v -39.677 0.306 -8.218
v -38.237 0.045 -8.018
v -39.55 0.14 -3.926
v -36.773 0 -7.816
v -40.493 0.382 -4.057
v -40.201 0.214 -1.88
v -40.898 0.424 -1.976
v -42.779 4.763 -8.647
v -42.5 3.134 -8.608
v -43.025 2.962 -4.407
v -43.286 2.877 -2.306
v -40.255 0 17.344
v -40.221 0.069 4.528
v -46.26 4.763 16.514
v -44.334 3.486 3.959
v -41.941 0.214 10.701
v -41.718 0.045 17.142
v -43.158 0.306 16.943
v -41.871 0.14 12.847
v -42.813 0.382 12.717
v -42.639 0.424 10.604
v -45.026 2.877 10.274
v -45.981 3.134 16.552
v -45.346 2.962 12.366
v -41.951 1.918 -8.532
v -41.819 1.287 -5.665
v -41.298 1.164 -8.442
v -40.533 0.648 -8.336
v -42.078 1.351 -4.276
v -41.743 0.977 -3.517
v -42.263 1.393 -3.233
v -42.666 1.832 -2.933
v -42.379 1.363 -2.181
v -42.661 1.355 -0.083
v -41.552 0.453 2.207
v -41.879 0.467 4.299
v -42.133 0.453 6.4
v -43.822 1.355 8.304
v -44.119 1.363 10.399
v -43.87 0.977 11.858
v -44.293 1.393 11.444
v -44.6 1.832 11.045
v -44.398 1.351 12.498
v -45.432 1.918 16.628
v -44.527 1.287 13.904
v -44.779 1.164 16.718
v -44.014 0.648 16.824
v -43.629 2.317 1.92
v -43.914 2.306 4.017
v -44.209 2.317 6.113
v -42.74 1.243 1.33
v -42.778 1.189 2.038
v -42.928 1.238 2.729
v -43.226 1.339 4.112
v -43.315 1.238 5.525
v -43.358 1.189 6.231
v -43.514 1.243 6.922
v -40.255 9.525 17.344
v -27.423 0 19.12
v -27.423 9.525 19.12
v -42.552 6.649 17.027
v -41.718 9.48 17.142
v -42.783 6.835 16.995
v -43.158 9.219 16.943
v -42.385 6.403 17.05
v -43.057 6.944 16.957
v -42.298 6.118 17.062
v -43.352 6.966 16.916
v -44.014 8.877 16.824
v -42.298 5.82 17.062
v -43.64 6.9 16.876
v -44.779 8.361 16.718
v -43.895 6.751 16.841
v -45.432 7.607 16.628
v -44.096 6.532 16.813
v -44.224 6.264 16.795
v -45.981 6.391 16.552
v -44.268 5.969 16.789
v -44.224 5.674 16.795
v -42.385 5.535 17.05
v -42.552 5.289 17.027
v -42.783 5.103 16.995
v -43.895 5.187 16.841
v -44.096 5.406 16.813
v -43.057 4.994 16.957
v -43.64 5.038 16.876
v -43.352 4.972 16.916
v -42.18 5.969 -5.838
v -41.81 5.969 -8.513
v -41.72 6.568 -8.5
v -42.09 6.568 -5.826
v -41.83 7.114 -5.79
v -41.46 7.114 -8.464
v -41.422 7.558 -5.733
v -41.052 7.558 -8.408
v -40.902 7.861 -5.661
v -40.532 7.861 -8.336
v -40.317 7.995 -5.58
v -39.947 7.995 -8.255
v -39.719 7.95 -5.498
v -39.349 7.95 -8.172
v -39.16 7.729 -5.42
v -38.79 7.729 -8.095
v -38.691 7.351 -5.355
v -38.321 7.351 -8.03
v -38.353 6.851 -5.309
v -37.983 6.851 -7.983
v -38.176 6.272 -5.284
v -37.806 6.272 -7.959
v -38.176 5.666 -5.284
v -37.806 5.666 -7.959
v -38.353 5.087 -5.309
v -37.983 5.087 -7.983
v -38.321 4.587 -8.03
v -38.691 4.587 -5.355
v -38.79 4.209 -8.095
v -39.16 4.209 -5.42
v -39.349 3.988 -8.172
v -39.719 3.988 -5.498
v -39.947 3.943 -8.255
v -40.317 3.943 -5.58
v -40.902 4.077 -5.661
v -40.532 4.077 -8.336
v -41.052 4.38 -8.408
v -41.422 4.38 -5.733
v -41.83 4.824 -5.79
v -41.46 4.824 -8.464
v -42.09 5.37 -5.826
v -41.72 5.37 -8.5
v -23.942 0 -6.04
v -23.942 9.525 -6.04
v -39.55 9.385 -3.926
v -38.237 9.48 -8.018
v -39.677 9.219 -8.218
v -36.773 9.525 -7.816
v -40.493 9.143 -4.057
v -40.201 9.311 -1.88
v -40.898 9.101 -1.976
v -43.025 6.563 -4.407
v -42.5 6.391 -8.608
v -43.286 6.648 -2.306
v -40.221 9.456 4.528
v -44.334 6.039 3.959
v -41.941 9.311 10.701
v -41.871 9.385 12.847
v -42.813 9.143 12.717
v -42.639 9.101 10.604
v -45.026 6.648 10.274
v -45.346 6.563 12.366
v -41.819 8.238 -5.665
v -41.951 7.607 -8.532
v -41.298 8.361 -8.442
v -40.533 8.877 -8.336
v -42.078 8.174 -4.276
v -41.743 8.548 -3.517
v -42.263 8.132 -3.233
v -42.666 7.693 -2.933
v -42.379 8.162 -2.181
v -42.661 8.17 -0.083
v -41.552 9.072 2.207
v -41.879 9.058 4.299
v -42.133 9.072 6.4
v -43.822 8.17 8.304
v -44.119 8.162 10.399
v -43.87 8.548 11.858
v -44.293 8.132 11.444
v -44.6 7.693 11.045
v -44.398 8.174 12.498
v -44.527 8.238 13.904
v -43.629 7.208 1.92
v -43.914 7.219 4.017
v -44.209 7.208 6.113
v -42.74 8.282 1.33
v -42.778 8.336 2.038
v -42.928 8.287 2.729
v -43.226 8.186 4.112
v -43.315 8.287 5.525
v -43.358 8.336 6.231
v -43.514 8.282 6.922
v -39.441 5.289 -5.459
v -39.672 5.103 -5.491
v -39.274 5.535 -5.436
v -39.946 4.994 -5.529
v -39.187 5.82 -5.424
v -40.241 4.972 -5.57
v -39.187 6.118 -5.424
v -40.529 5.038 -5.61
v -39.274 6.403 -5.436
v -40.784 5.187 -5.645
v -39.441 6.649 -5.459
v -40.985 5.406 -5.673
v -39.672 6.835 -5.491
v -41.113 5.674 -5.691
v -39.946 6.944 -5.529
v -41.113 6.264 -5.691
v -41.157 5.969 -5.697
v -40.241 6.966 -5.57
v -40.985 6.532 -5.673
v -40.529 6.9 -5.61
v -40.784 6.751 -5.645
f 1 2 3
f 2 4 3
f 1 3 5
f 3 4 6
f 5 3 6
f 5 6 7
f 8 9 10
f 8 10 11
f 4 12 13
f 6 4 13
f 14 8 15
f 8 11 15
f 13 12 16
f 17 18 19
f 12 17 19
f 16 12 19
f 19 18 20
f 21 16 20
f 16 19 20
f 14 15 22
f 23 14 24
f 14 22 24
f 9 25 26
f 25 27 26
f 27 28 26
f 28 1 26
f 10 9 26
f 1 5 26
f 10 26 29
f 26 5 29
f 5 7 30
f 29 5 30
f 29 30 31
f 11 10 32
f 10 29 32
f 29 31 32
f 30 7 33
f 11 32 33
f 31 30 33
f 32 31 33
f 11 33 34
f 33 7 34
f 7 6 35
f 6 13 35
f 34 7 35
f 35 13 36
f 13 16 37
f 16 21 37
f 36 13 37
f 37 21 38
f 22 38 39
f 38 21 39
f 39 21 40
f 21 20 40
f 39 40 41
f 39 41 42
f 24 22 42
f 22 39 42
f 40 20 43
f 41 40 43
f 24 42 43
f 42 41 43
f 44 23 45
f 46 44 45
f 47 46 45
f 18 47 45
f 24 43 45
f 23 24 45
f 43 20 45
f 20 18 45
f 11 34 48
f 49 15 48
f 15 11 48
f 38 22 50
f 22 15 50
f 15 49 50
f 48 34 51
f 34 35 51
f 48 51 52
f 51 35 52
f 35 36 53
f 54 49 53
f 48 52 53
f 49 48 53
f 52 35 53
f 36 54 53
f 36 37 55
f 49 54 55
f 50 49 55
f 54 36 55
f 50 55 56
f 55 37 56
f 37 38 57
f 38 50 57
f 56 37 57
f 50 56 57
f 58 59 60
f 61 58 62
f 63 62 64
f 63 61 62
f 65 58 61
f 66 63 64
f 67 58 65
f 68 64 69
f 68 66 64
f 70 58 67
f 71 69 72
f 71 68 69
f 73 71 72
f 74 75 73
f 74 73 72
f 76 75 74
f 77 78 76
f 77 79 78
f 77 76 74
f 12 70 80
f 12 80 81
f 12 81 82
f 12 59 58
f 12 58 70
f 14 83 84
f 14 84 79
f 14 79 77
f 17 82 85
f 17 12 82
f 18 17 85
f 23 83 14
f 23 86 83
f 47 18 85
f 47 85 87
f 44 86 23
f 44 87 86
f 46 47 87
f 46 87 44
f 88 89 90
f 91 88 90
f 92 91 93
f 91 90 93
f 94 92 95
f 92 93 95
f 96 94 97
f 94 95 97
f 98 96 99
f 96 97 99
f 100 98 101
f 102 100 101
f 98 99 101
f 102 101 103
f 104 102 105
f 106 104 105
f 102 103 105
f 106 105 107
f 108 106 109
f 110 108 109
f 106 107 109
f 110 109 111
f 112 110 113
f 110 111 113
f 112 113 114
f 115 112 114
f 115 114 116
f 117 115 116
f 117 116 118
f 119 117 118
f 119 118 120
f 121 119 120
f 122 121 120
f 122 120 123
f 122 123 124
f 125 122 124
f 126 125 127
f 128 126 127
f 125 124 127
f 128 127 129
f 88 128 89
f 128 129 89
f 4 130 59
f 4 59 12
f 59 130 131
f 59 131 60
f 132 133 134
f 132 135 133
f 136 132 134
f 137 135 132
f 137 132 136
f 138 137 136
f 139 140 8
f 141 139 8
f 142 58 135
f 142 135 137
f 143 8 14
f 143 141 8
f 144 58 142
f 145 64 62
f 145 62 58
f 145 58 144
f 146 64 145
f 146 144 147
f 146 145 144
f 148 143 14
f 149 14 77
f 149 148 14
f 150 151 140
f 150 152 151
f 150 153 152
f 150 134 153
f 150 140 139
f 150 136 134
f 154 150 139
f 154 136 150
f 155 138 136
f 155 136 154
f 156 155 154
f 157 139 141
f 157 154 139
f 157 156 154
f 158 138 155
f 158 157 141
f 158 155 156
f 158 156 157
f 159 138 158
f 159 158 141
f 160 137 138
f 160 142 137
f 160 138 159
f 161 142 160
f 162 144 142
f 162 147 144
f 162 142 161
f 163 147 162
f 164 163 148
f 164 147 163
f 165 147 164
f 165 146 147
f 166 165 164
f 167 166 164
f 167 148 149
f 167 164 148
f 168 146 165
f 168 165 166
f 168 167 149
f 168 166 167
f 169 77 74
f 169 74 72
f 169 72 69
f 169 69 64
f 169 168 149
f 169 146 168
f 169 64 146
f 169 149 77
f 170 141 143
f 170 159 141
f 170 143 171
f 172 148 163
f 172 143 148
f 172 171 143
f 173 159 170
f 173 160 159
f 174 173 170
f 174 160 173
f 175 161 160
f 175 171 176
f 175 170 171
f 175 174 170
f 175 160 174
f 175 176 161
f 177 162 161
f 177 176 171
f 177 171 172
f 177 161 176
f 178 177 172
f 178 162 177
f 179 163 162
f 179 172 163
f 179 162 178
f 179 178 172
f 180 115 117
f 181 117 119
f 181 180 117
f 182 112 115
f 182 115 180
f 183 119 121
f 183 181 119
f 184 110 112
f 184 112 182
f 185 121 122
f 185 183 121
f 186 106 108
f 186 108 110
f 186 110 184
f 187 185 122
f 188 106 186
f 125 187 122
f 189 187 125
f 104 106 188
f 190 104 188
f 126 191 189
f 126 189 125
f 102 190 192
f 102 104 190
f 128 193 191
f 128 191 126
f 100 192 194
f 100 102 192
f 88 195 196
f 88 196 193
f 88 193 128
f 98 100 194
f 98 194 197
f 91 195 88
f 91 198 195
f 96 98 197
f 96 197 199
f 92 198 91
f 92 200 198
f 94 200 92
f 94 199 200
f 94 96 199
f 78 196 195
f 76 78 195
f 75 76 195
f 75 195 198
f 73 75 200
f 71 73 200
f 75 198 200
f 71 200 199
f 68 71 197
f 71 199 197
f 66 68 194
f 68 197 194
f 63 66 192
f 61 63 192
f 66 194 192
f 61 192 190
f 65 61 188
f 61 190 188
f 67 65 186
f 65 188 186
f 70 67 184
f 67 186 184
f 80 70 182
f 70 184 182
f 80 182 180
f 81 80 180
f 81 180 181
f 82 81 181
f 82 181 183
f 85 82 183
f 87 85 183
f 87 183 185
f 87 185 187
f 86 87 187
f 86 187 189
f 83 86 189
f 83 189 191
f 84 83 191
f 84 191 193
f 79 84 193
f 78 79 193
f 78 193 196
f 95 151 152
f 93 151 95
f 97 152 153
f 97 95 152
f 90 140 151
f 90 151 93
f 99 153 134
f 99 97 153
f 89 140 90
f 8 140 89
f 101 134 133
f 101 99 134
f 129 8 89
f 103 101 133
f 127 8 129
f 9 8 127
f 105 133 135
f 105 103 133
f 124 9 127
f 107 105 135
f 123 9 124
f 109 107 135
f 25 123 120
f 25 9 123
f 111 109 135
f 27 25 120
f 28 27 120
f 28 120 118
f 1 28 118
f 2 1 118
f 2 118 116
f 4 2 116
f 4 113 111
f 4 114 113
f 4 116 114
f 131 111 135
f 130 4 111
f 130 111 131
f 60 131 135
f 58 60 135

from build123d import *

# Parameters (mm, degrees)
BOSS_EXTRUDE1_DEPTH = 9.525
SKETCH3_R           = 2.032
CUT_EXTRUDE1_DEPTH  = 2.7
SKETCH4_R           = 1.000000032
CUT_EXTRUDE2_DEPTH  = 51.984772229
FILLET2_SIZE        = 6.096


with BuildPart() as part:
    # Sketch1 → Boss-Extrude1 (new body)
    with BuildSketch(Plane(origin=(0, 0, 0), x_dir=(1, 0, 0), z_dir=(0, 1, 0))):
        Polygon((-27.422743224, -19.119856123), (-46.29298428, -16.509012872), (-42.811859946, 8.651308536), (-23.941618889, 6.040465285), align=None)
    extrude(amount=BOSS_EXTRUDE1_DEPTH)

    # Sketch3 → Cut-Extrude1 (cut)
    with BuildSketch(Plane(origin=(0.316670388, 0, -2.684144047), x_dir=(-0.9905638349724136, 0, -0.13705213914691383), z_dir=(0.13705213914691383, 0, -0.9905638349724136))):
        with Locations((40.495544979, 5.969)):
            Circle(SKETCH3_R)
    extrude(amount=-CUT_EXTRUDE1_DEPTH, mode=Mode.SUBTRACT)

    # Sketch4 → Cut-Extrude2 (cut, through all)
    with BuildSketch(Plane(origin=(0.000303759, 0, -0.00219546), x_dir=(-0.9905638349724136, 0, -0.13705213914691383), z_dir=(0.1370521391469138, 0, -0.9905638349724135))):
        with Locations((40.549730429, 5.969)):
            Circle(SKETCH4_R)
    extrude(amount=-CUT_EXTRUDE2_DEPTH, mode=Mode.SUBTRACT)

    # Fillet2
    # a fillet whose section is not a circle: 6.096 mm, written as the material it takes off along each edge
    with BuildSketch(Plane(origin=(-48.38165888, 0, 31.605205717), x_dir=(0.9905638349724136, 0, 0.13705213914691353), z_dir=(0.13705213914691353, 0, -0.9905638349724136))) as fillet2_piece_1:
        with BuildLine():
            add(Edge.make_bspline([(FILLET2_SIZE, 0), (FILLET2_SIZE * 0.831801948466, 0), (FILLET2_SIZE * 0.663603896932, 0), (FILLET2_SIZE * 0.292893218813, -FILLET2_SIZE * 0.0716919198361), (FILLET2_SIZE * 0.0716919198361, -FILLET2_SIZE * 0.292893218813), (0, -FILLET2_SIZE * 0.663603896932), (0, -FILLET2_SIZE * 0.831801948466), (0, -FILLET2_SIZE)], knots=[0, 0, 0, 0, 0, 0, 0.5, 0.5, 1, 1, 1, 1, 1, 1], degree=5))
            Line((0, -FILLET2_SIZE), (0, 0))
            Line((0, 0), (FILLET2_SIZE, 0))
        make_face()
    extrude(amount=55.88, mode=Mode.SUBTRACT)
    with BuildSketch(Plane(origin=(-48.38165888, 9.525, 31.605205717), x_dir=(0.9905638349724136, 0, 0.13705213914691353), z_dir=(0.13705213914691353, 0, -0.9905638349724136))) as fillet2_piece_2:
        with BuildLine():
            add(Edge.make_bspline([(FILLET2_SIZE, 0), (FILLET2_SIZE * 0.831801948466, 0), (FILLET2_SIZE * 0.663603896932, 0), (FILLET2_SIZE * 0.292893218813, FILLET2_SIZE * 0.0716919198361), (FILLET2_SIZE * 0.0716919198361, FILLET2_SIZE * 0.292893218813), (0, FILLET2_SIZE * 0.663603896932), (0, FILLET2_SIZE * 0.831801948466), (0, FILLET2_SIZE)], knots=[0, 0, 0, 0, 0, 0, 0.5, 0.5, 1, 1, 1, 1, 1, 1], degree=5))
            Line((0, FILLET2_SIZE), (0, 0))
            Line((0, 0), (FILLET2_SIZE, 0))
        make_face()
    extrude(amount=55.88, mode=Mode.SUBTRACT)


solid = part.part
